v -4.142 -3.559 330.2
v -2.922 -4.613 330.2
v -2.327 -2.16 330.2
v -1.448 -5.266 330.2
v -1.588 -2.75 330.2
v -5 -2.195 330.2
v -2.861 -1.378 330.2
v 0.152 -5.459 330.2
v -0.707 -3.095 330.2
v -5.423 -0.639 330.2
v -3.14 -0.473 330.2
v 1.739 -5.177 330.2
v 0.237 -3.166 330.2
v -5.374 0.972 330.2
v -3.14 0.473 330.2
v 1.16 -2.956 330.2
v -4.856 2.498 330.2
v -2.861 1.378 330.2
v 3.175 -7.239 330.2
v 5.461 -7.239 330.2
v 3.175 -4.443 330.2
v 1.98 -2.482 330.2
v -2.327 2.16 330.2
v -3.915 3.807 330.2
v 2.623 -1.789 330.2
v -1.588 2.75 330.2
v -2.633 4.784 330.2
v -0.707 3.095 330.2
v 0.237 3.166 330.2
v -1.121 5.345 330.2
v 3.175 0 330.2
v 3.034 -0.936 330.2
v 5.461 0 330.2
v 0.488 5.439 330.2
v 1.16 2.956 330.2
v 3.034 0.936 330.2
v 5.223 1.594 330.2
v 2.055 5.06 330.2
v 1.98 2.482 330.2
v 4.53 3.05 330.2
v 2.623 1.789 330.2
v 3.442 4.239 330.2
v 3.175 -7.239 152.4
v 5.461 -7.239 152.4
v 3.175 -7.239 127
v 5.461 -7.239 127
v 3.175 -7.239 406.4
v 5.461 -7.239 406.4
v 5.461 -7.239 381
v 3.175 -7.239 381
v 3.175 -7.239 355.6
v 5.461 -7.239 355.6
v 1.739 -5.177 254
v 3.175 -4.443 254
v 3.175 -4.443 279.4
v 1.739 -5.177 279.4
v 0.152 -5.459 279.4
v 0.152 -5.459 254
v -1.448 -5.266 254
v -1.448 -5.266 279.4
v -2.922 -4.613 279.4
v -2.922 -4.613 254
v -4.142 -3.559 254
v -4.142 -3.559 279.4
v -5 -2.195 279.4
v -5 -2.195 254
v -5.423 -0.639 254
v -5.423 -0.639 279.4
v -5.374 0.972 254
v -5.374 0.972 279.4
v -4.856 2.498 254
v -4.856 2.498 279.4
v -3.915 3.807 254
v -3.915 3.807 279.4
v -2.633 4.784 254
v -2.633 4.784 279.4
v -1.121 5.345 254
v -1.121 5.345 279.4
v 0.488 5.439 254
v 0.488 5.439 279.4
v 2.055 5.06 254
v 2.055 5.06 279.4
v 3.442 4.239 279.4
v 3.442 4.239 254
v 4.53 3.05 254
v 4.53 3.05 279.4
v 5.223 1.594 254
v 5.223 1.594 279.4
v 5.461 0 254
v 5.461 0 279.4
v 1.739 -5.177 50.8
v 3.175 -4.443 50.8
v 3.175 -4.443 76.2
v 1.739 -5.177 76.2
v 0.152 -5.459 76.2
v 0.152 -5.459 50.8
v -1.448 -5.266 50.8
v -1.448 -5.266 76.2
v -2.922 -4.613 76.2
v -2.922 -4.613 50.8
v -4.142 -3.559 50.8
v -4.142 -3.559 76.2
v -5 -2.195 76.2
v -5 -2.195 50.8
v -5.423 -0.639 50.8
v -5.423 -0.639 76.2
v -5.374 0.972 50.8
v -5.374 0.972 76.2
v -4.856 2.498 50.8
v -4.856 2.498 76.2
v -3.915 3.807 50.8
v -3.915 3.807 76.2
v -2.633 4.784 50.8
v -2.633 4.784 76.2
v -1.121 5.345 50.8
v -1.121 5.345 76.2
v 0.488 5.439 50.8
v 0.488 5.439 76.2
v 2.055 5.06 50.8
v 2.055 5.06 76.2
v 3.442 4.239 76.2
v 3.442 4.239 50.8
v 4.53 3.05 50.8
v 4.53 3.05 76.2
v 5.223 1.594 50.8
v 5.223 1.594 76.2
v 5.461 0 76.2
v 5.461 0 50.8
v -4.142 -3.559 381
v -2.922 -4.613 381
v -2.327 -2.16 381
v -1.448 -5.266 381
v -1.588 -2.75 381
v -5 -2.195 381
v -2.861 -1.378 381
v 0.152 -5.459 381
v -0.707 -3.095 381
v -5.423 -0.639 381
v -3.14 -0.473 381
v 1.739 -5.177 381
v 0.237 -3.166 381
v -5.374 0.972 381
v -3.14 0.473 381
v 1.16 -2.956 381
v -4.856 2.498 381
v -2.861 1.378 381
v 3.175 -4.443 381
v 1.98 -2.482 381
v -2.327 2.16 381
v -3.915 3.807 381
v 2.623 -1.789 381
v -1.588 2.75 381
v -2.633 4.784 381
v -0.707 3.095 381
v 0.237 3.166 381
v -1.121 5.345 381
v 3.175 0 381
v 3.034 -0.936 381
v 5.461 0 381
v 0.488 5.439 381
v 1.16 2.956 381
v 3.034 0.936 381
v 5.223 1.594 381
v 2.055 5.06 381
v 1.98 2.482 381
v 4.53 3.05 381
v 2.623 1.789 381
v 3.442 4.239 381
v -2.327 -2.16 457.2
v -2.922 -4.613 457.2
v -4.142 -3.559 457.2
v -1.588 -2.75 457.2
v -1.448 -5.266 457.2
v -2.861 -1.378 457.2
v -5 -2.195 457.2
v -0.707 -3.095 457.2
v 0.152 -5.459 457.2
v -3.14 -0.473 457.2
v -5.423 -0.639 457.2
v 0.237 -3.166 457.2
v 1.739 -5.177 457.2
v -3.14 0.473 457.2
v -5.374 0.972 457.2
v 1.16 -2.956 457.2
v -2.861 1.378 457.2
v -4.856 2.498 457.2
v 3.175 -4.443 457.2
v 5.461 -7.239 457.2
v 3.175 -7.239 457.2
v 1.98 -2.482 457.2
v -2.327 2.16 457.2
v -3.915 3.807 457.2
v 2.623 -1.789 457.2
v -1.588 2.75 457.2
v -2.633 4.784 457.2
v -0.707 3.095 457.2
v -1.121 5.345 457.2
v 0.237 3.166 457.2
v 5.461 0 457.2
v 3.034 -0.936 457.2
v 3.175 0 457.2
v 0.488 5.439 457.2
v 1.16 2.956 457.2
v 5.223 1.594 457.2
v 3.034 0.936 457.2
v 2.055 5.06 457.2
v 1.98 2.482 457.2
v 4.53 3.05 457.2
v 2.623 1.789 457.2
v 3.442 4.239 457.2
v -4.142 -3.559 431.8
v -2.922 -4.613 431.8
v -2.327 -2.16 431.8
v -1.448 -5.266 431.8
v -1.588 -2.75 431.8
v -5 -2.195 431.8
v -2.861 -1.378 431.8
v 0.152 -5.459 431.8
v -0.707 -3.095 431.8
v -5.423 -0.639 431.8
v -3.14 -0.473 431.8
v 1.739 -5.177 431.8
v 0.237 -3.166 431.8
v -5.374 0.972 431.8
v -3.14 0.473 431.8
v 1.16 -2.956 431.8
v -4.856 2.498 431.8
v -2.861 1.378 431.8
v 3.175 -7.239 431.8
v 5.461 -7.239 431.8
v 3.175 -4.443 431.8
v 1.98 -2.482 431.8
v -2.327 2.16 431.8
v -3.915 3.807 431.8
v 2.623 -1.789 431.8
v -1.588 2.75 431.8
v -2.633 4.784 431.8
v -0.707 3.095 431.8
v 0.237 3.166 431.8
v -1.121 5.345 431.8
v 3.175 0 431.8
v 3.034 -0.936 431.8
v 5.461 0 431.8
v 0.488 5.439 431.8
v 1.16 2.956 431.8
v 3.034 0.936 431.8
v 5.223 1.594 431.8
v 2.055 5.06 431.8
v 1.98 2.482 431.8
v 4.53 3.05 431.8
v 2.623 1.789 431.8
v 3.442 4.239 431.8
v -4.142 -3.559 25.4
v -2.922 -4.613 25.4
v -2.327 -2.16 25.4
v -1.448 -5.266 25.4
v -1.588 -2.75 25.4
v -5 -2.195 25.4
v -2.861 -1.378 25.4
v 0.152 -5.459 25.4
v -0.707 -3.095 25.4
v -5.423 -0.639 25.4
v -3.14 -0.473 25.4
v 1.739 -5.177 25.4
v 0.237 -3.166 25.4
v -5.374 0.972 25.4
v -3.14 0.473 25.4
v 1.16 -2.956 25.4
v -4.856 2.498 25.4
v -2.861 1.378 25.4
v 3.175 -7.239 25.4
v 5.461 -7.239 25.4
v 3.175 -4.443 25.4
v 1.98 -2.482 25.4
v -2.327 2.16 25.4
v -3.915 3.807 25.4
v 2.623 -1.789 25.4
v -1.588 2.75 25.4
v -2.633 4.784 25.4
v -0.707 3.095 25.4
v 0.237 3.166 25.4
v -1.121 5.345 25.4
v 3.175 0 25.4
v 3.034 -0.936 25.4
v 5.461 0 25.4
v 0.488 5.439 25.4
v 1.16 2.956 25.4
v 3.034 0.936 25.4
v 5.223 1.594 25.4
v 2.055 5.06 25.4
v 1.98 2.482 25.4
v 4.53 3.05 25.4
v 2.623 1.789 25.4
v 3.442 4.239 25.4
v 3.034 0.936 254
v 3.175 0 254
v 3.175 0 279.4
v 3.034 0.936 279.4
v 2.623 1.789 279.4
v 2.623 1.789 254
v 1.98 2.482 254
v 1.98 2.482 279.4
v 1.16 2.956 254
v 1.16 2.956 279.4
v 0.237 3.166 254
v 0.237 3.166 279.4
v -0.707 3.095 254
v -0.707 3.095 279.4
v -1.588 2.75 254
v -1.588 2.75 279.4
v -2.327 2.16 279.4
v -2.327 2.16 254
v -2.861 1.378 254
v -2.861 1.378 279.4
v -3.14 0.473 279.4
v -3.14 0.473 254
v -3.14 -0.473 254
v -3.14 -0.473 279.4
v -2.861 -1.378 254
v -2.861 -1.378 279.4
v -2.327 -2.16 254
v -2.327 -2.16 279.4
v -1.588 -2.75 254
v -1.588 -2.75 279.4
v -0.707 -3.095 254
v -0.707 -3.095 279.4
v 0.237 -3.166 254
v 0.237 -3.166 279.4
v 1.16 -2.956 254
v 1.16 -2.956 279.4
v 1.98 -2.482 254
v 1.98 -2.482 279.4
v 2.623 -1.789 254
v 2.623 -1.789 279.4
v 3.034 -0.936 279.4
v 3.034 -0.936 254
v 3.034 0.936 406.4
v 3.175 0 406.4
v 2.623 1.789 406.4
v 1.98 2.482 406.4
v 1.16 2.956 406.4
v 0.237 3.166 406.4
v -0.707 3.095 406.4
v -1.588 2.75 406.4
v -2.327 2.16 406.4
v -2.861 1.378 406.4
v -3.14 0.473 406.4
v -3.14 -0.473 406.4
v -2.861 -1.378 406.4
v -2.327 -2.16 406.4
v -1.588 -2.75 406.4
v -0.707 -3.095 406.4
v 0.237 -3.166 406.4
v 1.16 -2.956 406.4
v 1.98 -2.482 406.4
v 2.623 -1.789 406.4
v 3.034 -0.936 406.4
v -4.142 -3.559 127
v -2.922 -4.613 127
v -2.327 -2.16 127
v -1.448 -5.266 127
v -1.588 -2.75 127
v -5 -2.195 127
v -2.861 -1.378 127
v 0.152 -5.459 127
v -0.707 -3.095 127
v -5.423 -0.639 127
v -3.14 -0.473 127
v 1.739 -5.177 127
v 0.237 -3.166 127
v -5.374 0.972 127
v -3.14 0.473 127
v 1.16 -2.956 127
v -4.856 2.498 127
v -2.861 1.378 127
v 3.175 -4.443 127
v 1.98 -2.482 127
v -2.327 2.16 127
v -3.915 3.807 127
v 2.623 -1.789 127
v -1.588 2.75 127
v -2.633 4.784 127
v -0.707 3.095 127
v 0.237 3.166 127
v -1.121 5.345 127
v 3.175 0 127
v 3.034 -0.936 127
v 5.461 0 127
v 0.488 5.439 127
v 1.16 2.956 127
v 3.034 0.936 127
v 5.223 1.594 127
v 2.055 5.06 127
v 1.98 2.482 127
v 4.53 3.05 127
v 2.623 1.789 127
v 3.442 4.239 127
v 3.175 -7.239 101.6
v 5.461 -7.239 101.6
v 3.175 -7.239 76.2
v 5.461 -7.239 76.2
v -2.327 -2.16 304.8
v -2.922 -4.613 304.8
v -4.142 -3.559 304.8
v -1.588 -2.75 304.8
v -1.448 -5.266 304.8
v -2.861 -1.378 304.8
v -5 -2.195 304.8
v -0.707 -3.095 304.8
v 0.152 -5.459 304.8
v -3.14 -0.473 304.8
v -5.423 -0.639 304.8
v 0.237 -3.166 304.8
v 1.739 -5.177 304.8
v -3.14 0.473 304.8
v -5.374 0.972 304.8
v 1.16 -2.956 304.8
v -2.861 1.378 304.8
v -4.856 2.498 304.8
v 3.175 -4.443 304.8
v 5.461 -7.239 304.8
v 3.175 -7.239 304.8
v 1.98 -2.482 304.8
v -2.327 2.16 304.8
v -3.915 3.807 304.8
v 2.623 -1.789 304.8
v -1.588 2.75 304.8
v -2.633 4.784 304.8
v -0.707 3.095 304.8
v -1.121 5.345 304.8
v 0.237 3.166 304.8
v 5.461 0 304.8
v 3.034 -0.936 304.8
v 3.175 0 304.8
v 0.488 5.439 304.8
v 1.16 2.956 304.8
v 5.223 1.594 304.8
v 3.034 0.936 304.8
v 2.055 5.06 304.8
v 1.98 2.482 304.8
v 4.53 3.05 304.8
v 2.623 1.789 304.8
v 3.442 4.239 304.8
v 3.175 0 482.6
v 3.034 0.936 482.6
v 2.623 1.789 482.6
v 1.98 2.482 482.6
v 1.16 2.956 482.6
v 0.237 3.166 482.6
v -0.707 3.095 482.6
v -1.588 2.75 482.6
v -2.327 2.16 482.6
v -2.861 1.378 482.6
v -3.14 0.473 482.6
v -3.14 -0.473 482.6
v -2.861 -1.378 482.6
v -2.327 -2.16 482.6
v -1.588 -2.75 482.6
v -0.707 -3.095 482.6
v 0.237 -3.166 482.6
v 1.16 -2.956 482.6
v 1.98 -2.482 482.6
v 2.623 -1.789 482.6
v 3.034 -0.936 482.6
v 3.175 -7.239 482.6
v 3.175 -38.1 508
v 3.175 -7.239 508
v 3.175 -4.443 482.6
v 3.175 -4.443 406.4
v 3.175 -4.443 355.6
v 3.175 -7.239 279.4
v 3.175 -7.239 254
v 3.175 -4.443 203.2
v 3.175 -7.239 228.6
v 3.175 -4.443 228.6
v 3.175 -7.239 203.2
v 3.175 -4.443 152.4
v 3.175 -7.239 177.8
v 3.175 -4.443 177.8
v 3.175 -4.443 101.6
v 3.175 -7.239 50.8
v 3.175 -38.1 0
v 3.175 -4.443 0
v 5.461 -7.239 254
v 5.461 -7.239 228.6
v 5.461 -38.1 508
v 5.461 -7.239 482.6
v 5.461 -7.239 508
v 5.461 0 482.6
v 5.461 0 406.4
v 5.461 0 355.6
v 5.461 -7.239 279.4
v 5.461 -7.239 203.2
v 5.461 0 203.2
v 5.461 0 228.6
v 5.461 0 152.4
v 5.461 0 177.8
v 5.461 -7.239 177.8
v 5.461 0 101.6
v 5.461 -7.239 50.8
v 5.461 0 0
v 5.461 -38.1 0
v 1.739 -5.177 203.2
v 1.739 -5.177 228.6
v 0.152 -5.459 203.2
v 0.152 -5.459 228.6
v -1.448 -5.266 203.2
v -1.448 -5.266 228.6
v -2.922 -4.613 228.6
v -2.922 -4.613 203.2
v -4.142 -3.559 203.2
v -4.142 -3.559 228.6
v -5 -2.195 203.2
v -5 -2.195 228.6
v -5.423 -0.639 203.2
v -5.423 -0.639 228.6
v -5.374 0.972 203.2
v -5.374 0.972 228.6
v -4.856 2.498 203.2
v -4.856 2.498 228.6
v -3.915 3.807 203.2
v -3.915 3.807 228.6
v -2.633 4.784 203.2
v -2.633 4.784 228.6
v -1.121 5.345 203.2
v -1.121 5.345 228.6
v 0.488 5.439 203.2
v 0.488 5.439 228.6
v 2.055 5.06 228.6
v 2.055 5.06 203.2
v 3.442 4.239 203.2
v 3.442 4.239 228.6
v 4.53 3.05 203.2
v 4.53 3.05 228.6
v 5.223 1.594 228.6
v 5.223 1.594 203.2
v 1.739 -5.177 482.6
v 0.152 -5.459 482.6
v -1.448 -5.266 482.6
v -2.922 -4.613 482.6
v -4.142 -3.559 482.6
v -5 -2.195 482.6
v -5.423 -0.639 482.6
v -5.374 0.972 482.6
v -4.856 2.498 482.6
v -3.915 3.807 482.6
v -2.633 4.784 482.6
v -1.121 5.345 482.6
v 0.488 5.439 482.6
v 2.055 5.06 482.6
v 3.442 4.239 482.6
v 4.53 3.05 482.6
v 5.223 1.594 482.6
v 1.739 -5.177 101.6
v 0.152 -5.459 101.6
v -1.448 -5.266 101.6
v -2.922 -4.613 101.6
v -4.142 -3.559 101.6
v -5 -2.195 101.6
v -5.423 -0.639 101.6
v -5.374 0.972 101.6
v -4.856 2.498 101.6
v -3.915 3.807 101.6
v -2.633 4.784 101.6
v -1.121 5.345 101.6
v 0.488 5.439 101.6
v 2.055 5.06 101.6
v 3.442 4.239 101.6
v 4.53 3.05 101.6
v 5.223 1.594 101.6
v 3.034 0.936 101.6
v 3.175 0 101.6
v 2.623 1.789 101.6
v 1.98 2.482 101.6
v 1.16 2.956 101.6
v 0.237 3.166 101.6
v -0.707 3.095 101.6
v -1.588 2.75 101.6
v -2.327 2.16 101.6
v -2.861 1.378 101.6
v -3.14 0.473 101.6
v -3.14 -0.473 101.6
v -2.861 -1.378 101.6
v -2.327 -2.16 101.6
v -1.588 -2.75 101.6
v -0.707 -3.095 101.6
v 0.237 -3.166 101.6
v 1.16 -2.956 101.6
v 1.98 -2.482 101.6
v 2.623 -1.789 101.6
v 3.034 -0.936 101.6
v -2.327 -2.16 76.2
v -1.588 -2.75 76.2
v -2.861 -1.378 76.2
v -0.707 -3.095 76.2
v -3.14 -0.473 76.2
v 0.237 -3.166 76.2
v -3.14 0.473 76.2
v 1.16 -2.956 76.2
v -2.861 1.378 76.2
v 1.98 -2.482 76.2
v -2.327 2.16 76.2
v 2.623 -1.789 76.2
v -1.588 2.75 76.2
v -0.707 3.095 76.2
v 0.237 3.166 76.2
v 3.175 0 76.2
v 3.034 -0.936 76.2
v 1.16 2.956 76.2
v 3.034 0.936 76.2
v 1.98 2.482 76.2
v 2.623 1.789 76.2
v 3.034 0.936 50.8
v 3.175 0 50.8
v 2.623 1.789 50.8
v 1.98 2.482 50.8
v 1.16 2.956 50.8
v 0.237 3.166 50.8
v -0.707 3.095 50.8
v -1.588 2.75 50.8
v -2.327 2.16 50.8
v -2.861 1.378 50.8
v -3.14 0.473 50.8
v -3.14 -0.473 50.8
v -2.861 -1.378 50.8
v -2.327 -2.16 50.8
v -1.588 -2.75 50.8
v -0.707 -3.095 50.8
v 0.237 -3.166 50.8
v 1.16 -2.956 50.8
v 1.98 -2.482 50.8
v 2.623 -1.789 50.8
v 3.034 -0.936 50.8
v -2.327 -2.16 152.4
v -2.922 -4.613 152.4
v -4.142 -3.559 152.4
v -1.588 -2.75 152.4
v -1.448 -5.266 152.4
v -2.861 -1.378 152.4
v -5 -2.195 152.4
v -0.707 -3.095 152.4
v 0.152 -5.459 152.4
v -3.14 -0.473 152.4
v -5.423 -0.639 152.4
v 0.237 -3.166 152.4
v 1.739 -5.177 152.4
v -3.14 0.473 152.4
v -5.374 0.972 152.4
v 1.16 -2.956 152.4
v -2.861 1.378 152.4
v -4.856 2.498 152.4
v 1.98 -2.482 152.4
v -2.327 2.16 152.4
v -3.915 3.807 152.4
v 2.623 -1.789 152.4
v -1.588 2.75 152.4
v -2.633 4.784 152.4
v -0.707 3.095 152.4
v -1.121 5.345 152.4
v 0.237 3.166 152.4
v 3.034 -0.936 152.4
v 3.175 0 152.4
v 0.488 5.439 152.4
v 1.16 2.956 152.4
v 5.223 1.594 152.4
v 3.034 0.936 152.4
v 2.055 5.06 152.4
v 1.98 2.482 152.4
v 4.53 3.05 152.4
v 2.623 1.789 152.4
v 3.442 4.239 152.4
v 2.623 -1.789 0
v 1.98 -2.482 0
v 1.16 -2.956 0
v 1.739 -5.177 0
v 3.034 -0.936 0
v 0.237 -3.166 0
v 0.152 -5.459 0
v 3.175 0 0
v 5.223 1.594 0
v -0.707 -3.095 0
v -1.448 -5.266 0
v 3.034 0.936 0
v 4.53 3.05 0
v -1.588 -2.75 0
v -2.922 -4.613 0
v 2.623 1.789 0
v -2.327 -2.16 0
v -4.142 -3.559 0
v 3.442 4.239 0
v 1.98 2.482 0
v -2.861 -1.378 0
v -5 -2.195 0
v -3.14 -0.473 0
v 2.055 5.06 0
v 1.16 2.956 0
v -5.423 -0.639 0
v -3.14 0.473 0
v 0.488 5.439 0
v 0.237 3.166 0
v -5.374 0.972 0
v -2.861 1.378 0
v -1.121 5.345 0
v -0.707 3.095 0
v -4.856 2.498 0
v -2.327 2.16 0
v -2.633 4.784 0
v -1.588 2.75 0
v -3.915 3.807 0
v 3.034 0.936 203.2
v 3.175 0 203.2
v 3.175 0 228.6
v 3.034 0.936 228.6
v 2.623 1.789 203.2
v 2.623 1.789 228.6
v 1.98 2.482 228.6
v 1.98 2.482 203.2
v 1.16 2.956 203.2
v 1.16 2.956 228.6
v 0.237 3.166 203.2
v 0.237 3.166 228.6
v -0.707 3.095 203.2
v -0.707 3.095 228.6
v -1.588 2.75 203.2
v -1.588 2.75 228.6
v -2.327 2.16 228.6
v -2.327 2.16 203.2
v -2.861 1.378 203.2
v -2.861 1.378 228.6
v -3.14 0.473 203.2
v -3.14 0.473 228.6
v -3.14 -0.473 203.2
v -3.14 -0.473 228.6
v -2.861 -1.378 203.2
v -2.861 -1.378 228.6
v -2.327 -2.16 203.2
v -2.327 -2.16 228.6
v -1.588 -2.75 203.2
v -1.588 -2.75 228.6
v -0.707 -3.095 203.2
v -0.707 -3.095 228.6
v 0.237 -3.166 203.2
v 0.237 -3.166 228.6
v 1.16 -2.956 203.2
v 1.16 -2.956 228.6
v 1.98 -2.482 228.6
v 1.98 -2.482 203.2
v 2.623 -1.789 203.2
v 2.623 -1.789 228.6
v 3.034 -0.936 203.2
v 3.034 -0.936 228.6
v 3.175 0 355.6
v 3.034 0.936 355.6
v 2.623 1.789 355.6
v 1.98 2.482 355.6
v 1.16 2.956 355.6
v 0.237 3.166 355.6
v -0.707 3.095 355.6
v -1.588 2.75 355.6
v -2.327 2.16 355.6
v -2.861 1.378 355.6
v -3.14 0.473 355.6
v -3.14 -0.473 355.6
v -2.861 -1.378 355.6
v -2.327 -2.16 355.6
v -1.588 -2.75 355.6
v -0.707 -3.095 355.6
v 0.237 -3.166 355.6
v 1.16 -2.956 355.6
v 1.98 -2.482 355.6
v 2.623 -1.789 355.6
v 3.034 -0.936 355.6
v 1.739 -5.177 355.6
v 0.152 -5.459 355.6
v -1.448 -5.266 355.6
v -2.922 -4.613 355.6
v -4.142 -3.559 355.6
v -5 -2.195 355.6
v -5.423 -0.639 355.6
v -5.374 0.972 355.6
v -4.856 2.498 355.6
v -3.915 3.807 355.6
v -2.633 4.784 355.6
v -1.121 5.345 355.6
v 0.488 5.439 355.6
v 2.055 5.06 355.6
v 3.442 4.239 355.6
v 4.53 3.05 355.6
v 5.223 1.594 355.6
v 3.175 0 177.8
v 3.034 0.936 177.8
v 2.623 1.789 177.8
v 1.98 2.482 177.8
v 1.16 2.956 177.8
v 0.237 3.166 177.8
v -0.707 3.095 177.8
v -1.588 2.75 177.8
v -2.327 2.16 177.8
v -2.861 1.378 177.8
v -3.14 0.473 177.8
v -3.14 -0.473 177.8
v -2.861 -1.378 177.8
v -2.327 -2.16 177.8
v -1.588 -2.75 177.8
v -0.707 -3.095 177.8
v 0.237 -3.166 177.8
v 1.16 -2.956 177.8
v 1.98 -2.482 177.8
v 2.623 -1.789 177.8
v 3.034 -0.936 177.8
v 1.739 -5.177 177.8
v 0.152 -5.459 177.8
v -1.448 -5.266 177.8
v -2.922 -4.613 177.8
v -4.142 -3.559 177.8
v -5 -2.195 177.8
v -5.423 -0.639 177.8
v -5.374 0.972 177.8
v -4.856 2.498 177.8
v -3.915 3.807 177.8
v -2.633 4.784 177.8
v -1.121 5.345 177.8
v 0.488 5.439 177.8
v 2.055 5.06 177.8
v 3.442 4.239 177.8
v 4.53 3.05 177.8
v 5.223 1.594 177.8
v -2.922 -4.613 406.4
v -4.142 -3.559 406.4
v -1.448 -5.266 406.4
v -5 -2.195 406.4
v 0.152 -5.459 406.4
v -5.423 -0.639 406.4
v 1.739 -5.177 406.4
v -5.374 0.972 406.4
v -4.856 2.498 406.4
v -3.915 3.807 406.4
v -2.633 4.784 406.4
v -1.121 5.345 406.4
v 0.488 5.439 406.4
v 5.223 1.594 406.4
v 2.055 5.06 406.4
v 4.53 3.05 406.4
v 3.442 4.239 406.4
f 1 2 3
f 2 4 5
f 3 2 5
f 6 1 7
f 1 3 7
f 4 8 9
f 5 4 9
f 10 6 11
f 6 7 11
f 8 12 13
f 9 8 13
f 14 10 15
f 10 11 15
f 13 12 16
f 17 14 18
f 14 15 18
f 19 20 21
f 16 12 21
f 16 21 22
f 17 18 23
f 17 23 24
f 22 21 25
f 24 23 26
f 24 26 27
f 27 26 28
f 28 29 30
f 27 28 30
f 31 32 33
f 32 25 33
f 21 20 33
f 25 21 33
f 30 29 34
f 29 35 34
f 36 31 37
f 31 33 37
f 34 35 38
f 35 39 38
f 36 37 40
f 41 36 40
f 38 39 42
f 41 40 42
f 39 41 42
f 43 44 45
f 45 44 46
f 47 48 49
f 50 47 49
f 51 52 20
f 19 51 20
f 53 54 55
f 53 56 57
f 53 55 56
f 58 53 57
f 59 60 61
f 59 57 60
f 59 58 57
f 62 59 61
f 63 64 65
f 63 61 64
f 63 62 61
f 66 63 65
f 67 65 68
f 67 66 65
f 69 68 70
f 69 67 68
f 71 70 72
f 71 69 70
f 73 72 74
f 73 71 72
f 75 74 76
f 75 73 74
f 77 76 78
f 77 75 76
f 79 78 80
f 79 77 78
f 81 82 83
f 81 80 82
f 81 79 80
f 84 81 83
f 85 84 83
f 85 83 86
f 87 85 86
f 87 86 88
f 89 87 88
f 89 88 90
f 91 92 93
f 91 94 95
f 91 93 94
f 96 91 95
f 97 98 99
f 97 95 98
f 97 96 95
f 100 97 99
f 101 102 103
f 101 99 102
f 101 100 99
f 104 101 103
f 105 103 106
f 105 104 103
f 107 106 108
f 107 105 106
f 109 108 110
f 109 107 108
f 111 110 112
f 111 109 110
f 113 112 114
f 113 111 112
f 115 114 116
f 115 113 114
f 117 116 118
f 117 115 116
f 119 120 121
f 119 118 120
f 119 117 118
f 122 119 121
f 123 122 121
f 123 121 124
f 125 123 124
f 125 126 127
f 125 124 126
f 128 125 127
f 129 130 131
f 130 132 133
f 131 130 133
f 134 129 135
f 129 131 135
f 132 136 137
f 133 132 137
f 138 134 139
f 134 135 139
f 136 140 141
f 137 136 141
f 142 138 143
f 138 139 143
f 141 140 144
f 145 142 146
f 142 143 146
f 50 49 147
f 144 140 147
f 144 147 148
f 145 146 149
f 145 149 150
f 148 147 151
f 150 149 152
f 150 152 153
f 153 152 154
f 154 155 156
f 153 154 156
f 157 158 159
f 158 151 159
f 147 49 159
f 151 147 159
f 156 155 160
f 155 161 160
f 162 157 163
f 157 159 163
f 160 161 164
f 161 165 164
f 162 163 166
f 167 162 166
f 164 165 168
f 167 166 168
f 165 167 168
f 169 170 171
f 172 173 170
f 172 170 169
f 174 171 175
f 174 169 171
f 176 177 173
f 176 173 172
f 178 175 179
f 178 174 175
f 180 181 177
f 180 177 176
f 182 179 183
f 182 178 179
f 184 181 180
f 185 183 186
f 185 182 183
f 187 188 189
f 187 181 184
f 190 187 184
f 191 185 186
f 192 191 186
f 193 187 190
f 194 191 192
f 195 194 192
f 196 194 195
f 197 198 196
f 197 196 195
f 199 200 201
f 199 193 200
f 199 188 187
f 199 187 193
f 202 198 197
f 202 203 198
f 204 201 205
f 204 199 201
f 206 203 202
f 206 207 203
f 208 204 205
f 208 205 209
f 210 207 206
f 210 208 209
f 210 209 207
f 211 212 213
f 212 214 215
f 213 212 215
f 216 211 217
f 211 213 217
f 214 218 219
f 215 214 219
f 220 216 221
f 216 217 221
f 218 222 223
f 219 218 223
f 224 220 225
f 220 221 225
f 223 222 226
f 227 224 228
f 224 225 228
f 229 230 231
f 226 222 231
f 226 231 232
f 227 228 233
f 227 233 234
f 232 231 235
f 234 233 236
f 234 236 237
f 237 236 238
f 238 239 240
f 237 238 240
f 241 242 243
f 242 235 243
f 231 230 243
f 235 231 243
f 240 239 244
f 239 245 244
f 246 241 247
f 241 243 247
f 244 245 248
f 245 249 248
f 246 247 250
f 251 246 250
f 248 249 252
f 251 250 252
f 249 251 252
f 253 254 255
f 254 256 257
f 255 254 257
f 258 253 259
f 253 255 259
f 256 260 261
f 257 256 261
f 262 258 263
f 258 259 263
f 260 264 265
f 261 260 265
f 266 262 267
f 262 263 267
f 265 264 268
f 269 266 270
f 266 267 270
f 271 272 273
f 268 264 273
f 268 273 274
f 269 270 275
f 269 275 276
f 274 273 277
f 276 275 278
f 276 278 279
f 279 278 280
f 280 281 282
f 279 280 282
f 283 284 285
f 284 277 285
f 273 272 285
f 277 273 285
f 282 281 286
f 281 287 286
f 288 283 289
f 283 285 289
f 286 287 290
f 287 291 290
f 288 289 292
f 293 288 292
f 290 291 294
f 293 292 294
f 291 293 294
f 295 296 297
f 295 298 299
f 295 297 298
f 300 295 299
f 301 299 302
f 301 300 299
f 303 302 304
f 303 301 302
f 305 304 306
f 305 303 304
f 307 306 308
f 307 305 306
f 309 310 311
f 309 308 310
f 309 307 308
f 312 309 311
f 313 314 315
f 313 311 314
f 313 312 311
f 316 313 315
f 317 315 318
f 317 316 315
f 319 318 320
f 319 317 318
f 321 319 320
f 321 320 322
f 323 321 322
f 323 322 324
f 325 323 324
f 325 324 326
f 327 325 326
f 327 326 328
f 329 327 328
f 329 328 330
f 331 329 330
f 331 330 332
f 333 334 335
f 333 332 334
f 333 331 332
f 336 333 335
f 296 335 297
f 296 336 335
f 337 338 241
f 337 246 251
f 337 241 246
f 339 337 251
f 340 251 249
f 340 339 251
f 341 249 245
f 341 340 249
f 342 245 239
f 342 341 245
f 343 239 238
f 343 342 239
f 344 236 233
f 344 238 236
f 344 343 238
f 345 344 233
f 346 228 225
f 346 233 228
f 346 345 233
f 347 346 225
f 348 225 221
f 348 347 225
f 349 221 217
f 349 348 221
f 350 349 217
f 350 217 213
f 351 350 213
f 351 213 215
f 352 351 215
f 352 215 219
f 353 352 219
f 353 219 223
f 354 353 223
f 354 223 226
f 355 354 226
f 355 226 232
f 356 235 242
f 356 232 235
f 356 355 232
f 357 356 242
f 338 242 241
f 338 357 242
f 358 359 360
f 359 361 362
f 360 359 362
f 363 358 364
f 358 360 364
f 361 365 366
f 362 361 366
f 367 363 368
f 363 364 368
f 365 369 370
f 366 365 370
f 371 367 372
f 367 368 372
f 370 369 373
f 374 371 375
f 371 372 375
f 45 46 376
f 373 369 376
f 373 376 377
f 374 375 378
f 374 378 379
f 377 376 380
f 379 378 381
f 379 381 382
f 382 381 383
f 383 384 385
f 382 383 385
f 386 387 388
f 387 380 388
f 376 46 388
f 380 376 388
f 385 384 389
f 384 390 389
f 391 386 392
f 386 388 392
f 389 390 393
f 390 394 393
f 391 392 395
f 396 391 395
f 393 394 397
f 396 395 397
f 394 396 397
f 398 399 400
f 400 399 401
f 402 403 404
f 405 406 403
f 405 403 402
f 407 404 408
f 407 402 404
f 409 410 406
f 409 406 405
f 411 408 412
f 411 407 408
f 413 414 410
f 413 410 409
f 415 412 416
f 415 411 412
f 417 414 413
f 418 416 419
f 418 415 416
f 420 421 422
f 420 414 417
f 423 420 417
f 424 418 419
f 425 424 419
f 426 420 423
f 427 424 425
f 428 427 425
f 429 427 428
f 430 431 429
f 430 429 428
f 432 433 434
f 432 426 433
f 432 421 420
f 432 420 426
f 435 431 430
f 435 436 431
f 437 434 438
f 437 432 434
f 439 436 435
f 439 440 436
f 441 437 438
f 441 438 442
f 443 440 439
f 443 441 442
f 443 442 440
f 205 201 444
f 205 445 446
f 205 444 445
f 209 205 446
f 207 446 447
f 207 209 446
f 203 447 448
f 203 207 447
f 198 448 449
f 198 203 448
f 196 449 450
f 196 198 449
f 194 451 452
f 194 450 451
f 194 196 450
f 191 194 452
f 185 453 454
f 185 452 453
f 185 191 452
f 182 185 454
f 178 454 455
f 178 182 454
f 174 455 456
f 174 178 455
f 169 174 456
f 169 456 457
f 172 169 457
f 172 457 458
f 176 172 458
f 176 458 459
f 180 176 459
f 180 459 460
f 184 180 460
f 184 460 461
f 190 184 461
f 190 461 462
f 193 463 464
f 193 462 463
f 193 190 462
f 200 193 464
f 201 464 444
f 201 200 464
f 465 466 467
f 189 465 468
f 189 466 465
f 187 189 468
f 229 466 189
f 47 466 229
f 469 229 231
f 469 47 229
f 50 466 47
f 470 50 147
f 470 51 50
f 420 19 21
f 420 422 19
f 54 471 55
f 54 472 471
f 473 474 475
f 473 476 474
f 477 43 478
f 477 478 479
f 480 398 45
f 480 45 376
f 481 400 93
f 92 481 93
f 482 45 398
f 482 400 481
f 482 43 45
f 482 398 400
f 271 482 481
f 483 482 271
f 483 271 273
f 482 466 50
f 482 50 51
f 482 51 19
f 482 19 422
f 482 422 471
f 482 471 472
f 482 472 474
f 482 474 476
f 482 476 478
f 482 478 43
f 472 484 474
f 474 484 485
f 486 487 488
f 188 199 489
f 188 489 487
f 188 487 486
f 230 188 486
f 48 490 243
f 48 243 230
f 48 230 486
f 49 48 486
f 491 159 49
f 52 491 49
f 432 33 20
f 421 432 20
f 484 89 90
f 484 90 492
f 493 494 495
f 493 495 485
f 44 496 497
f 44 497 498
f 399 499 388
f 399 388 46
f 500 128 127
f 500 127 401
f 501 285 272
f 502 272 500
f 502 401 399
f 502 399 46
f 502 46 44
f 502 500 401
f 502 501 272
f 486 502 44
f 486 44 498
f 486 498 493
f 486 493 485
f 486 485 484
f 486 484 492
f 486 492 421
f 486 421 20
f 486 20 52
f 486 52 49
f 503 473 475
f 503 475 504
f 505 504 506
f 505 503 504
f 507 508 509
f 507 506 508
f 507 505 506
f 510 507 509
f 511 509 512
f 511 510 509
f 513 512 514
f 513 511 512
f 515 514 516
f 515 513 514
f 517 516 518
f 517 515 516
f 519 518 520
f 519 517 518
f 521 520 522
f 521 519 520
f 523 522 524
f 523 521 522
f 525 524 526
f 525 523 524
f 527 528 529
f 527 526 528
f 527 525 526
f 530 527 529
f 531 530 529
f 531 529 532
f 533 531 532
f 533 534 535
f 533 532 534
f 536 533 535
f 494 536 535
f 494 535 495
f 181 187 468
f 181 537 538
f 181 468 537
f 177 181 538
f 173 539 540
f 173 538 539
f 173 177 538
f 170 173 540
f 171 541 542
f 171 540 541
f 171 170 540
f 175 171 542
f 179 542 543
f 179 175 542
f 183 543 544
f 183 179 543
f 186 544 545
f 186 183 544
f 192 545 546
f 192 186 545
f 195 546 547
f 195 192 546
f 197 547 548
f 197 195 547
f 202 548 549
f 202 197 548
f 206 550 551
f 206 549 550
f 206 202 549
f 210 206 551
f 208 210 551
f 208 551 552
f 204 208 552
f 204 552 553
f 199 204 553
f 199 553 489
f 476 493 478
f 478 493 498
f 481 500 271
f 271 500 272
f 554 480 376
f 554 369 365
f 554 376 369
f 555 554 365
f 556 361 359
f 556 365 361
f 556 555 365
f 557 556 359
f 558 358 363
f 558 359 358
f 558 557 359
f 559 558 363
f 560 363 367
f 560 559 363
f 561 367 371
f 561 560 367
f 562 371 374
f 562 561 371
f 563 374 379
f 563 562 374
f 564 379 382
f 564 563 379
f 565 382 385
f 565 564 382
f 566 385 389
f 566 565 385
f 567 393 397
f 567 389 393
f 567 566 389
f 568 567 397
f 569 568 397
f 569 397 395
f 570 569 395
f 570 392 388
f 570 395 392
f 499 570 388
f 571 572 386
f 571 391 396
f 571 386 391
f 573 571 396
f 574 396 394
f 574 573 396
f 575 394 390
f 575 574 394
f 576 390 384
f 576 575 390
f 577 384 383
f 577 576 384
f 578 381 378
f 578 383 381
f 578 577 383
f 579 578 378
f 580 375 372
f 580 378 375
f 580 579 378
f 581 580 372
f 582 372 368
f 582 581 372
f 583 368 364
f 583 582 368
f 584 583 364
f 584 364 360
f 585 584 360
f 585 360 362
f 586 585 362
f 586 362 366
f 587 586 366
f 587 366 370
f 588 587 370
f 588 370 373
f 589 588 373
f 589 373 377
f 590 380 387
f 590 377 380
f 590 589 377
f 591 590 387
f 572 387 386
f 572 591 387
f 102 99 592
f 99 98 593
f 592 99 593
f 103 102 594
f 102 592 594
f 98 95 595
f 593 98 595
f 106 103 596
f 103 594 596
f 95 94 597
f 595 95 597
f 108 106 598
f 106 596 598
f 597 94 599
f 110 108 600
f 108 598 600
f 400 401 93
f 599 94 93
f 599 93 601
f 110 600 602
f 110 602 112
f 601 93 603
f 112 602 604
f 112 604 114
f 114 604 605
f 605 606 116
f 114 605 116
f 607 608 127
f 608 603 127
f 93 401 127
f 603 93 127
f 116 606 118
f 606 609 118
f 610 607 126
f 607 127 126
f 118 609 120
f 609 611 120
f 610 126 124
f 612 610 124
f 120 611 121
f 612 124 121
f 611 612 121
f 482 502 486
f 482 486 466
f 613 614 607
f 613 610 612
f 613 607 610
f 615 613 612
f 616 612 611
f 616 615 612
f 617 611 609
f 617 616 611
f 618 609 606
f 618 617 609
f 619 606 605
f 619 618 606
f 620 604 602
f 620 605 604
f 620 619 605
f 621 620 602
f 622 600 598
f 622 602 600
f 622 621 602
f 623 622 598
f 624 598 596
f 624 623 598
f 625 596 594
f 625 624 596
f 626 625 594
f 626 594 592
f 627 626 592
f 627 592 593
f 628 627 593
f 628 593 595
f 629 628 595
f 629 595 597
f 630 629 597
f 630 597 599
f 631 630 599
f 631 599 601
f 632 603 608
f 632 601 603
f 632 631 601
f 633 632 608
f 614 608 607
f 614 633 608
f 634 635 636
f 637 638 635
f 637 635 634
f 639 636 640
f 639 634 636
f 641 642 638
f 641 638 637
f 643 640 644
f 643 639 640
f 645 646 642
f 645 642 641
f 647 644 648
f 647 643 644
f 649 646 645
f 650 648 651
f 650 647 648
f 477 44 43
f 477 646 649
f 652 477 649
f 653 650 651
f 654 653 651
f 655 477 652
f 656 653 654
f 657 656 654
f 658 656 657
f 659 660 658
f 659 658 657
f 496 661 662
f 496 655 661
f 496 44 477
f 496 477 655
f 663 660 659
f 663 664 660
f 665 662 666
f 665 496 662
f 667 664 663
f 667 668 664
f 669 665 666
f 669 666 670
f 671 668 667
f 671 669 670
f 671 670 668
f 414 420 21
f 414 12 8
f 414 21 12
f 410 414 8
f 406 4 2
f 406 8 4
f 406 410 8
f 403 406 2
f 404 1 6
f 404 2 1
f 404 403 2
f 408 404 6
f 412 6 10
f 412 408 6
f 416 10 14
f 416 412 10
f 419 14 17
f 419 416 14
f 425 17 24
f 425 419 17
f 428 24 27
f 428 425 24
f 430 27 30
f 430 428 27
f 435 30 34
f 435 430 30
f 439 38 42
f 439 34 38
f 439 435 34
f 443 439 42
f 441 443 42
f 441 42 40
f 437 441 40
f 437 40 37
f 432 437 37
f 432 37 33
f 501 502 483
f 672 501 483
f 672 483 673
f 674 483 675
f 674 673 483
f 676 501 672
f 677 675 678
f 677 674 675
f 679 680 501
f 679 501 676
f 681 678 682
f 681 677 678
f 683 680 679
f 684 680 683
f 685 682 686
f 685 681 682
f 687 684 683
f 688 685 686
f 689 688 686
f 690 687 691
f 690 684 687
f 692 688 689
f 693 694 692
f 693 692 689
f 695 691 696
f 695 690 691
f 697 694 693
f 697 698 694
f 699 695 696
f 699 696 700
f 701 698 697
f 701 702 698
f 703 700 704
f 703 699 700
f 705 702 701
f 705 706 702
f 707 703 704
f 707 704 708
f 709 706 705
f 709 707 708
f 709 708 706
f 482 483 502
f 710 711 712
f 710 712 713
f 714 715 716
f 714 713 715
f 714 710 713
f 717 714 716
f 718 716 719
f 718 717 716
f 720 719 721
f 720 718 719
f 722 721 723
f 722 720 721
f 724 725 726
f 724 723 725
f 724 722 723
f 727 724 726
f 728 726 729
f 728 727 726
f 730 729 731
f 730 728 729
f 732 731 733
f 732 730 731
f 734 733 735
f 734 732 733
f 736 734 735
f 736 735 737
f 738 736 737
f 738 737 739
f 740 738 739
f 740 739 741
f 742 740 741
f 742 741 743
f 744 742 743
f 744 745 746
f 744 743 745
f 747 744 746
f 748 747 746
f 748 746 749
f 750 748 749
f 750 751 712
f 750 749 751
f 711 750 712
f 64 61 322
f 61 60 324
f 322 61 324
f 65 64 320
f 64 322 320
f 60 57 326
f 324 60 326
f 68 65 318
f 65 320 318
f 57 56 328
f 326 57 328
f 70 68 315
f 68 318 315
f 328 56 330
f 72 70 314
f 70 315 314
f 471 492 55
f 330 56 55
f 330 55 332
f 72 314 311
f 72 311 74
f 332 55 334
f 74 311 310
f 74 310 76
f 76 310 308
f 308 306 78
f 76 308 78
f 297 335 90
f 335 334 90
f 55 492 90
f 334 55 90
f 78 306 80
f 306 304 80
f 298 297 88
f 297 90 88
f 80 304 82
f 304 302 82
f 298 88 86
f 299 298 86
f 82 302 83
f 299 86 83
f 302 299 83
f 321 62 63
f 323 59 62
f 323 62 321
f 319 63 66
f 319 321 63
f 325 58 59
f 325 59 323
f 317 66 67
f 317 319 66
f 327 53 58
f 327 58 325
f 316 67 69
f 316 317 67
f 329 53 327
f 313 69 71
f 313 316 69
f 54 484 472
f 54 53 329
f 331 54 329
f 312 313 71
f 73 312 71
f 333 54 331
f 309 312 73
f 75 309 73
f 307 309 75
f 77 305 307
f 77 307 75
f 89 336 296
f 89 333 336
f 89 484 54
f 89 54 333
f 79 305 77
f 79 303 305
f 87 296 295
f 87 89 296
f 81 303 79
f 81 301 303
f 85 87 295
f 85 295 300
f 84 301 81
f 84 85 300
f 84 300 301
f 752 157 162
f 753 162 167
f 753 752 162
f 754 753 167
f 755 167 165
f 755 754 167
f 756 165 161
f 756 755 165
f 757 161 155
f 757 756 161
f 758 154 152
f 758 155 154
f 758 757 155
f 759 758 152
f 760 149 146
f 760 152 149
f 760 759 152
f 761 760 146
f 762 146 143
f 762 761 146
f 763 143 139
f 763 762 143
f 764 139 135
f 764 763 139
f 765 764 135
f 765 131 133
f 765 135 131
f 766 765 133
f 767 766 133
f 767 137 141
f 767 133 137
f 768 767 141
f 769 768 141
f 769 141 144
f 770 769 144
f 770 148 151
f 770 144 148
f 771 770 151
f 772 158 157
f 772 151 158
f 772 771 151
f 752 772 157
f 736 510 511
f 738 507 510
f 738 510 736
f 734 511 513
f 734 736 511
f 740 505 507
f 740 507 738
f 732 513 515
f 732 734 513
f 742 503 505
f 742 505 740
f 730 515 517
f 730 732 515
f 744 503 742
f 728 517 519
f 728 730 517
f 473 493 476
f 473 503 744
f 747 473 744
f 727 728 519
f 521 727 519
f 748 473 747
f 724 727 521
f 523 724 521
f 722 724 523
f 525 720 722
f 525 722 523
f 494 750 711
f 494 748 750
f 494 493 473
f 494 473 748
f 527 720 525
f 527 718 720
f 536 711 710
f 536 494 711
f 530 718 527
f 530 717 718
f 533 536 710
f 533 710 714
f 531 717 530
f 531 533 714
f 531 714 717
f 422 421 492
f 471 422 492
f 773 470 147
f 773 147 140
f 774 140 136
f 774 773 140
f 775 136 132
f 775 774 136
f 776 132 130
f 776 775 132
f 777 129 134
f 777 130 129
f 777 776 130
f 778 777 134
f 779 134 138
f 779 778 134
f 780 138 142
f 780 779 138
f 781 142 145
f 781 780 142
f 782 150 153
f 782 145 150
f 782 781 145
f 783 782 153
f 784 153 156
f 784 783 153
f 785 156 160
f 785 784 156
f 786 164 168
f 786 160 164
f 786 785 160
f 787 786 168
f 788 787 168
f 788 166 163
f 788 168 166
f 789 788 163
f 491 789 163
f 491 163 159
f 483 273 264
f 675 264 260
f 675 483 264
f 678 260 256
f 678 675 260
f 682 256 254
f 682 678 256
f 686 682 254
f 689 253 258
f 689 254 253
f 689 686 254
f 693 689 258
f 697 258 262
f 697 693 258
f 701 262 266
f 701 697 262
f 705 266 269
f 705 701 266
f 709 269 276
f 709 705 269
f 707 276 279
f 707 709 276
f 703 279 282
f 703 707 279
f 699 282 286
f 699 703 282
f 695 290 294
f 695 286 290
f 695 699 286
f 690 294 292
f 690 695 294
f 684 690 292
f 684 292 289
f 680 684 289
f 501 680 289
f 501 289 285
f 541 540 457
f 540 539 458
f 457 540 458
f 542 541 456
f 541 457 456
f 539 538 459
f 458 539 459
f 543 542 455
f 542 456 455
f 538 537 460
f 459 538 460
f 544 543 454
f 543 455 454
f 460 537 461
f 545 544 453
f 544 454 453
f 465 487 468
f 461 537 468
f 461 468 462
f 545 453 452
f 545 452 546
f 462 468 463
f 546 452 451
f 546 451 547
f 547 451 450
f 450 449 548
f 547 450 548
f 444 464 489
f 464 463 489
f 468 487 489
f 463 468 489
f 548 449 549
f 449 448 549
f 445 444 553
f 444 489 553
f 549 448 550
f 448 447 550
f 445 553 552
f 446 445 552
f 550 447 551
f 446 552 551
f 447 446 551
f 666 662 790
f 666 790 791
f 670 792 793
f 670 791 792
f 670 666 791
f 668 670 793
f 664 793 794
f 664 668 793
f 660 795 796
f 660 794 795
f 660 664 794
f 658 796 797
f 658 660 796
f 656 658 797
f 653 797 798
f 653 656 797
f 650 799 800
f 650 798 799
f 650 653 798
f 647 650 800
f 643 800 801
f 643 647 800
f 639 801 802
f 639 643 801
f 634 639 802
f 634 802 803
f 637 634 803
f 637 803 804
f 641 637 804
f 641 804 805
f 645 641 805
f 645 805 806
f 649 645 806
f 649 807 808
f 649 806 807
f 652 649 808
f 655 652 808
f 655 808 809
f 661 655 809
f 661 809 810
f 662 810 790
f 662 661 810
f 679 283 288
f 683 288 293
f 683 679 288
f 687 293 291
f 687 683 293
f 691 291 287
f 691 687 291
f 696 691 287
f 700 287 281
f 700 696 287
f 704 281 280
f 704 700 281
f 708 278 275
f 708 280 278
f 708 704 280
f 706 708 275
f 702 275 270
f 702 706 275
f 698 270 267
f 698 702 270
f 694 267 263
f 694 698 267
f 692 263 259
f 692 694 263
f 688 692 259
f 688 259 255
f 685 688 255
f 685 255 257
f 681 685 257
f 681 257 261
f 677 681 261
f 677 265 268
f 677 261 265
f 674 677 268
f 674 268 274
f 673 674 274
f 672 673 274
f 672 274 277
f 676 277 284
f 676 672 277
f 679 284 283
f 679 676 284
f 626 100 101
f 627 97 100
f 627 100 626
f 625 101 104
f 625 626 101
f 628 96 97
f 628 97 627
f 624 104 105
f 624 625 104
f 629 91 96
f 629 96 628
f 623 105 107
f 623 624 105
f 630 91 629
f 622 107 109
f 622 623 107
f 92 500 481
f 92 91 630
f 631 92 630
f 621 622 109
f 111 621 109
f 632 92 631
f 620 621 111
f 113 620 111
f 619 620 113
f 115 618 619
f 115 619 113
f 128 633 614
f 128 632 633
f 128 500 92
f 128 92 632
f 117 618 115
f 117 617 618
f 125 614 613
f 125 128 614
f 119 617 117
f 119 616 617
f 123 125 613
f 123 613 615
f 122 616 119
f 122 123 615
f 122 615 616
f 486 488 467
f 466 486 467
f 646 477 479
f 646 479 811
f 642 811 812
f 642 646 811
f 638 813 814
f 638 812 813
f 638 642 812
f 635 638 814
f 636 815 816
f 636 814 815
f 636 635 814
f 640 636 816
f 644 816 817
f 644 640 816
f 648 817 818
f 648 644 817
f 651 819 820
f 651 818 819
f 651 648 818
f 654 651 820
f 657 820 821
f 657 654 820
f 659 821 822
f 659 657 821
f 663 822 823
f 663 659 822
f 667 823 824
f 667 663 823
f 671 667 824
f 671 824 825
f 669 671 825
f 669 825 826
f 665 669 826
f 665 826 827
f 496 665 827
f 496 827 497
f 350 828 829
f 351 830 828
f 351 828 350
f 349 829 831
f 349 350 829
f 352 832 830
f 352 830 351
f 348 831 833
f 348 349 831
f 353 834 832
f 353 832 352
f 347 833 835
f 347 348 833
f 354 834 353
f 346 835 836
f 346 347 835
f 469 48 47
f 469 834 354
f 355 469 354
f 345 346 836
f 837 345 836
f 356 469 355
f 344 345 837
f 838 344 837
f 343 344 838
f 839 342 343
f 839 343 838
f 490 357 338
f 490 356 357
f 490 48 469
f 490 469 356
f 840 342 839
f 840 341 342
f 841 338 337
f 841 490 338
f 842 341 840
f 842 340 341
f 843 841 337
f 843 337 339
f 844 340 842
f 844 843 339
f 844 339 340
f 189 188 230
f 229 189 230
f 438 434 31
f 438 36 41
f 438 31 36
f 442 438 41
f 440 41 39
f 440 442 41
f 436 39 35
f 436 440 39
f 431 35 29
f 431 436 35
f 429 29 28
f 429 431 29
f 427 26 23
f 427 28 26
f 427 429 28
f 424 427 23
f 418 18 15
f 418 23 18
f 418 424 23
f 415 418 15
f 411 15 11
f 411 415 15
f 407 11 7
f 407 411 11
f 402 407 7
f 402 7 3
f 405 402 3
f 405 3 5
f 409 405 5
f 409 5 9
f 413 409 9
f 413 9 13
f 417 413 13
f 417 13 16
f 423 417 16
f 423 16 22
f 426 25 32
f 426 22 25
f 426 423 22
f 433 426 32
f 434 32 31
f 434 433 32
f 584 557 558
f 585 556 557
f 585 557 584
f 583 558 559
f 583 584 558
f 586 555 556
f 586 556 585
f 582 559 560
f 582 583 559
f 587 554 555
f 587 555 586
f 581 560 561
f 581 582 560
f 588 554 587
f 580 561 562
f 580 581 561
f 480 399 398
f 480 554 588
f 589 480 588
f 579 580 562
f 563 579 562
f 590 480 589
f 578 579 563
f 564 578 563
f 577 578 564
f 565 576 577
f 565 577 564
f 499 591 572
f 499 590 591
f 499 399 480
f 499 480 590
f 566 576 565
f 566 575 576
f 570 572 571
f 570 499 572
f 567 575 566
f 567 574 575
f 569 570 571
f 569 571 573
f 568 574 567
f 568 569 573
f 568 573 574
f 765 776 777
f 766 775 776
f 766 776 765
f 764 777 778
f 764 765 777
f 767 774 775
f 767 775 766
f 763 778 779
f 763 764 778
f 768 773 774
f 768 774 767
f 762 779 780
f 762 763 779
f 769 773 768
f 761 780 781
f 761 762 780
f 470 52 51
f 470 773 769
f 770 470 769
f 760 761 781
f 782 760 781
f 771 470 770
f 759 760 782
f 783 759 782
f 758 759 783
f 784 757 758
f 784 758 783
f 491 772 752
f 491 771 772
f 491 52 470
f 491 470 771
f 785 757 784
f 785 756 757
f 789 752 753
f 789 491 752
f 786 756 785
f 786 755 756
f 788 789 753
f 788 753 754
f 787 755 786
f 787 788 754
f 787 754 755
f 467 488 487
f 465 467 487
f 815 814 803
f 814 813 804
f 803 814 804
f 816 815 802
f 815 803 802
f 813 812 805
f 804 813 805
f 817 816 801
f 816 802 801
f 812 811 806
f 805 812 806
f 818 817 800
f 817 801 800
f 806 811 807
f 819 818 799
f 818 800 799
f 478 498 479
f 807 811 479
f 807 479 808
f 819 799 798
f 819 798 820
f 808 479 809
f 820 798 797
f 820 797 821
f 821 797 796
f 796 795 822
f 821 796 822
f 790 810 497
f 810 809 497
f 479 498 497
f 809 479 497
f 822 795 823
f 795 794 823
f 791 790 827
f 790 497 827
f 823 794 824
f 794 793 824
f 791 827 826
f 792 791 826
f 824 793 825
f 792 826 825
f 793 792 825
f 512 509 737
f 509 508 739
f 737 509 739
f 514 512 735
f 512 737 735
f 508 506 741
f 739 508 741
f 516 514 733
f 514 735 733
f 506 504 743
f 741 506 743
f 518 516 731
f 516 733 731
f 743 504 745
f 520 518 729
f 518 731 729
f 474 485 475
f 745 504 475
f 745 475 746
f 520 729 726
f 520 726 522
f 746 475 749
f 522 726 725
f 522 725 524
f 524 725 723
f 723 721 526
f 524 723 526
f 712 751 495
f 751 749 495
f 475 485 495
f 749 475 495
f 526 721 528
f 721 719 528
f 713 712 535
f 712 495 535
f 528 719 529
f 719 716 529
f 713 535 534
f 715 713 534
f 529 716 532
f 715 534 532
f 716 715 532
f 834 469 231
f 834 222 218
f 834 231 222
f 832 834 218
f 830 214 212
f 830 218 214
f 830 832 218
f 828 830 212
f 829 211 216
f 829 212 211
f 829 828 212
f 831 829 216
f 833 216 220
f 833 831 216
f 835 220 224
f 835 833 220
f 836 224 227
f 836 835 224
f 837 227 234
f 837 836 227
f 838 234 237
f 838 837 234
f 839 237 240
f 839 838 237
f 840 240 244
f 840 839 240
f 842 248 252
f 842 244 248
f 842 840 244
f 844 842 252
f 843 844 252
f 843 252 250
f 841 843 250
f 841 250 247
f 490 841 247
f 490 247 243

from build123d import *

# Parameters (mm, degrees)
SKETCH1_R           = 3.175
BOSS_EXTRUDE1_DEPTH = 508
SKETCH2_W           = 25.4
SKETCH2_H           = 12.7
CUT_EXTRUDE1_DEPTH  = 11.922
LPATTERN1_COUNT     = 10
LPATTERN1_PITCH     = 50.8


with BuildPart() as part:
    # Sketch1 → Boss-Extrude1 (new body)
    with BuildSketch(Plane.XY):
        with BuildLine():
            Line((5.461, 0), (5.461, -38.1))
            Line((5.461, -38.1), (3.175, -38.1))
            Line((3.175, -38.1), (3.175, -4.443185344))
            ThreePointArc((3.175, -4.443185344), (-4.855985791, 2.498384078), (5.461, 0))
        make_face()
        Circle(SKETCH1_R, mode=Mode.SUBTRACT)
    extrude(amount=BOSS_EXTRUDE1_DEPTH)

    # Sketch2 → Cut-Extrude1 (cut, through all)
    with BuildSketch(Plane(origin=(5.461, 0, 0), x_dir=(0, 0, -1), z_dir=(1, 0, 0))):
        with Locations((-495.3, -0.889)):
            Rectangle(SKETCH2_W, SKETCH2_H)
    cut_extrude1 = extrude(amount=-CUT_EXTRUDE1_DEPTH, mode=Mode.SUBTRACT)

    # LPattern1: Cut-Extrude1 ×10
    with Locations(*[(0, 0, -i * LPATTERN1_PITCH) for i in range(1, LPATTERN1_COUNT)]):
        add(cut_extrude1, mode=Mode.SUBTRACT)


solid = part.part
